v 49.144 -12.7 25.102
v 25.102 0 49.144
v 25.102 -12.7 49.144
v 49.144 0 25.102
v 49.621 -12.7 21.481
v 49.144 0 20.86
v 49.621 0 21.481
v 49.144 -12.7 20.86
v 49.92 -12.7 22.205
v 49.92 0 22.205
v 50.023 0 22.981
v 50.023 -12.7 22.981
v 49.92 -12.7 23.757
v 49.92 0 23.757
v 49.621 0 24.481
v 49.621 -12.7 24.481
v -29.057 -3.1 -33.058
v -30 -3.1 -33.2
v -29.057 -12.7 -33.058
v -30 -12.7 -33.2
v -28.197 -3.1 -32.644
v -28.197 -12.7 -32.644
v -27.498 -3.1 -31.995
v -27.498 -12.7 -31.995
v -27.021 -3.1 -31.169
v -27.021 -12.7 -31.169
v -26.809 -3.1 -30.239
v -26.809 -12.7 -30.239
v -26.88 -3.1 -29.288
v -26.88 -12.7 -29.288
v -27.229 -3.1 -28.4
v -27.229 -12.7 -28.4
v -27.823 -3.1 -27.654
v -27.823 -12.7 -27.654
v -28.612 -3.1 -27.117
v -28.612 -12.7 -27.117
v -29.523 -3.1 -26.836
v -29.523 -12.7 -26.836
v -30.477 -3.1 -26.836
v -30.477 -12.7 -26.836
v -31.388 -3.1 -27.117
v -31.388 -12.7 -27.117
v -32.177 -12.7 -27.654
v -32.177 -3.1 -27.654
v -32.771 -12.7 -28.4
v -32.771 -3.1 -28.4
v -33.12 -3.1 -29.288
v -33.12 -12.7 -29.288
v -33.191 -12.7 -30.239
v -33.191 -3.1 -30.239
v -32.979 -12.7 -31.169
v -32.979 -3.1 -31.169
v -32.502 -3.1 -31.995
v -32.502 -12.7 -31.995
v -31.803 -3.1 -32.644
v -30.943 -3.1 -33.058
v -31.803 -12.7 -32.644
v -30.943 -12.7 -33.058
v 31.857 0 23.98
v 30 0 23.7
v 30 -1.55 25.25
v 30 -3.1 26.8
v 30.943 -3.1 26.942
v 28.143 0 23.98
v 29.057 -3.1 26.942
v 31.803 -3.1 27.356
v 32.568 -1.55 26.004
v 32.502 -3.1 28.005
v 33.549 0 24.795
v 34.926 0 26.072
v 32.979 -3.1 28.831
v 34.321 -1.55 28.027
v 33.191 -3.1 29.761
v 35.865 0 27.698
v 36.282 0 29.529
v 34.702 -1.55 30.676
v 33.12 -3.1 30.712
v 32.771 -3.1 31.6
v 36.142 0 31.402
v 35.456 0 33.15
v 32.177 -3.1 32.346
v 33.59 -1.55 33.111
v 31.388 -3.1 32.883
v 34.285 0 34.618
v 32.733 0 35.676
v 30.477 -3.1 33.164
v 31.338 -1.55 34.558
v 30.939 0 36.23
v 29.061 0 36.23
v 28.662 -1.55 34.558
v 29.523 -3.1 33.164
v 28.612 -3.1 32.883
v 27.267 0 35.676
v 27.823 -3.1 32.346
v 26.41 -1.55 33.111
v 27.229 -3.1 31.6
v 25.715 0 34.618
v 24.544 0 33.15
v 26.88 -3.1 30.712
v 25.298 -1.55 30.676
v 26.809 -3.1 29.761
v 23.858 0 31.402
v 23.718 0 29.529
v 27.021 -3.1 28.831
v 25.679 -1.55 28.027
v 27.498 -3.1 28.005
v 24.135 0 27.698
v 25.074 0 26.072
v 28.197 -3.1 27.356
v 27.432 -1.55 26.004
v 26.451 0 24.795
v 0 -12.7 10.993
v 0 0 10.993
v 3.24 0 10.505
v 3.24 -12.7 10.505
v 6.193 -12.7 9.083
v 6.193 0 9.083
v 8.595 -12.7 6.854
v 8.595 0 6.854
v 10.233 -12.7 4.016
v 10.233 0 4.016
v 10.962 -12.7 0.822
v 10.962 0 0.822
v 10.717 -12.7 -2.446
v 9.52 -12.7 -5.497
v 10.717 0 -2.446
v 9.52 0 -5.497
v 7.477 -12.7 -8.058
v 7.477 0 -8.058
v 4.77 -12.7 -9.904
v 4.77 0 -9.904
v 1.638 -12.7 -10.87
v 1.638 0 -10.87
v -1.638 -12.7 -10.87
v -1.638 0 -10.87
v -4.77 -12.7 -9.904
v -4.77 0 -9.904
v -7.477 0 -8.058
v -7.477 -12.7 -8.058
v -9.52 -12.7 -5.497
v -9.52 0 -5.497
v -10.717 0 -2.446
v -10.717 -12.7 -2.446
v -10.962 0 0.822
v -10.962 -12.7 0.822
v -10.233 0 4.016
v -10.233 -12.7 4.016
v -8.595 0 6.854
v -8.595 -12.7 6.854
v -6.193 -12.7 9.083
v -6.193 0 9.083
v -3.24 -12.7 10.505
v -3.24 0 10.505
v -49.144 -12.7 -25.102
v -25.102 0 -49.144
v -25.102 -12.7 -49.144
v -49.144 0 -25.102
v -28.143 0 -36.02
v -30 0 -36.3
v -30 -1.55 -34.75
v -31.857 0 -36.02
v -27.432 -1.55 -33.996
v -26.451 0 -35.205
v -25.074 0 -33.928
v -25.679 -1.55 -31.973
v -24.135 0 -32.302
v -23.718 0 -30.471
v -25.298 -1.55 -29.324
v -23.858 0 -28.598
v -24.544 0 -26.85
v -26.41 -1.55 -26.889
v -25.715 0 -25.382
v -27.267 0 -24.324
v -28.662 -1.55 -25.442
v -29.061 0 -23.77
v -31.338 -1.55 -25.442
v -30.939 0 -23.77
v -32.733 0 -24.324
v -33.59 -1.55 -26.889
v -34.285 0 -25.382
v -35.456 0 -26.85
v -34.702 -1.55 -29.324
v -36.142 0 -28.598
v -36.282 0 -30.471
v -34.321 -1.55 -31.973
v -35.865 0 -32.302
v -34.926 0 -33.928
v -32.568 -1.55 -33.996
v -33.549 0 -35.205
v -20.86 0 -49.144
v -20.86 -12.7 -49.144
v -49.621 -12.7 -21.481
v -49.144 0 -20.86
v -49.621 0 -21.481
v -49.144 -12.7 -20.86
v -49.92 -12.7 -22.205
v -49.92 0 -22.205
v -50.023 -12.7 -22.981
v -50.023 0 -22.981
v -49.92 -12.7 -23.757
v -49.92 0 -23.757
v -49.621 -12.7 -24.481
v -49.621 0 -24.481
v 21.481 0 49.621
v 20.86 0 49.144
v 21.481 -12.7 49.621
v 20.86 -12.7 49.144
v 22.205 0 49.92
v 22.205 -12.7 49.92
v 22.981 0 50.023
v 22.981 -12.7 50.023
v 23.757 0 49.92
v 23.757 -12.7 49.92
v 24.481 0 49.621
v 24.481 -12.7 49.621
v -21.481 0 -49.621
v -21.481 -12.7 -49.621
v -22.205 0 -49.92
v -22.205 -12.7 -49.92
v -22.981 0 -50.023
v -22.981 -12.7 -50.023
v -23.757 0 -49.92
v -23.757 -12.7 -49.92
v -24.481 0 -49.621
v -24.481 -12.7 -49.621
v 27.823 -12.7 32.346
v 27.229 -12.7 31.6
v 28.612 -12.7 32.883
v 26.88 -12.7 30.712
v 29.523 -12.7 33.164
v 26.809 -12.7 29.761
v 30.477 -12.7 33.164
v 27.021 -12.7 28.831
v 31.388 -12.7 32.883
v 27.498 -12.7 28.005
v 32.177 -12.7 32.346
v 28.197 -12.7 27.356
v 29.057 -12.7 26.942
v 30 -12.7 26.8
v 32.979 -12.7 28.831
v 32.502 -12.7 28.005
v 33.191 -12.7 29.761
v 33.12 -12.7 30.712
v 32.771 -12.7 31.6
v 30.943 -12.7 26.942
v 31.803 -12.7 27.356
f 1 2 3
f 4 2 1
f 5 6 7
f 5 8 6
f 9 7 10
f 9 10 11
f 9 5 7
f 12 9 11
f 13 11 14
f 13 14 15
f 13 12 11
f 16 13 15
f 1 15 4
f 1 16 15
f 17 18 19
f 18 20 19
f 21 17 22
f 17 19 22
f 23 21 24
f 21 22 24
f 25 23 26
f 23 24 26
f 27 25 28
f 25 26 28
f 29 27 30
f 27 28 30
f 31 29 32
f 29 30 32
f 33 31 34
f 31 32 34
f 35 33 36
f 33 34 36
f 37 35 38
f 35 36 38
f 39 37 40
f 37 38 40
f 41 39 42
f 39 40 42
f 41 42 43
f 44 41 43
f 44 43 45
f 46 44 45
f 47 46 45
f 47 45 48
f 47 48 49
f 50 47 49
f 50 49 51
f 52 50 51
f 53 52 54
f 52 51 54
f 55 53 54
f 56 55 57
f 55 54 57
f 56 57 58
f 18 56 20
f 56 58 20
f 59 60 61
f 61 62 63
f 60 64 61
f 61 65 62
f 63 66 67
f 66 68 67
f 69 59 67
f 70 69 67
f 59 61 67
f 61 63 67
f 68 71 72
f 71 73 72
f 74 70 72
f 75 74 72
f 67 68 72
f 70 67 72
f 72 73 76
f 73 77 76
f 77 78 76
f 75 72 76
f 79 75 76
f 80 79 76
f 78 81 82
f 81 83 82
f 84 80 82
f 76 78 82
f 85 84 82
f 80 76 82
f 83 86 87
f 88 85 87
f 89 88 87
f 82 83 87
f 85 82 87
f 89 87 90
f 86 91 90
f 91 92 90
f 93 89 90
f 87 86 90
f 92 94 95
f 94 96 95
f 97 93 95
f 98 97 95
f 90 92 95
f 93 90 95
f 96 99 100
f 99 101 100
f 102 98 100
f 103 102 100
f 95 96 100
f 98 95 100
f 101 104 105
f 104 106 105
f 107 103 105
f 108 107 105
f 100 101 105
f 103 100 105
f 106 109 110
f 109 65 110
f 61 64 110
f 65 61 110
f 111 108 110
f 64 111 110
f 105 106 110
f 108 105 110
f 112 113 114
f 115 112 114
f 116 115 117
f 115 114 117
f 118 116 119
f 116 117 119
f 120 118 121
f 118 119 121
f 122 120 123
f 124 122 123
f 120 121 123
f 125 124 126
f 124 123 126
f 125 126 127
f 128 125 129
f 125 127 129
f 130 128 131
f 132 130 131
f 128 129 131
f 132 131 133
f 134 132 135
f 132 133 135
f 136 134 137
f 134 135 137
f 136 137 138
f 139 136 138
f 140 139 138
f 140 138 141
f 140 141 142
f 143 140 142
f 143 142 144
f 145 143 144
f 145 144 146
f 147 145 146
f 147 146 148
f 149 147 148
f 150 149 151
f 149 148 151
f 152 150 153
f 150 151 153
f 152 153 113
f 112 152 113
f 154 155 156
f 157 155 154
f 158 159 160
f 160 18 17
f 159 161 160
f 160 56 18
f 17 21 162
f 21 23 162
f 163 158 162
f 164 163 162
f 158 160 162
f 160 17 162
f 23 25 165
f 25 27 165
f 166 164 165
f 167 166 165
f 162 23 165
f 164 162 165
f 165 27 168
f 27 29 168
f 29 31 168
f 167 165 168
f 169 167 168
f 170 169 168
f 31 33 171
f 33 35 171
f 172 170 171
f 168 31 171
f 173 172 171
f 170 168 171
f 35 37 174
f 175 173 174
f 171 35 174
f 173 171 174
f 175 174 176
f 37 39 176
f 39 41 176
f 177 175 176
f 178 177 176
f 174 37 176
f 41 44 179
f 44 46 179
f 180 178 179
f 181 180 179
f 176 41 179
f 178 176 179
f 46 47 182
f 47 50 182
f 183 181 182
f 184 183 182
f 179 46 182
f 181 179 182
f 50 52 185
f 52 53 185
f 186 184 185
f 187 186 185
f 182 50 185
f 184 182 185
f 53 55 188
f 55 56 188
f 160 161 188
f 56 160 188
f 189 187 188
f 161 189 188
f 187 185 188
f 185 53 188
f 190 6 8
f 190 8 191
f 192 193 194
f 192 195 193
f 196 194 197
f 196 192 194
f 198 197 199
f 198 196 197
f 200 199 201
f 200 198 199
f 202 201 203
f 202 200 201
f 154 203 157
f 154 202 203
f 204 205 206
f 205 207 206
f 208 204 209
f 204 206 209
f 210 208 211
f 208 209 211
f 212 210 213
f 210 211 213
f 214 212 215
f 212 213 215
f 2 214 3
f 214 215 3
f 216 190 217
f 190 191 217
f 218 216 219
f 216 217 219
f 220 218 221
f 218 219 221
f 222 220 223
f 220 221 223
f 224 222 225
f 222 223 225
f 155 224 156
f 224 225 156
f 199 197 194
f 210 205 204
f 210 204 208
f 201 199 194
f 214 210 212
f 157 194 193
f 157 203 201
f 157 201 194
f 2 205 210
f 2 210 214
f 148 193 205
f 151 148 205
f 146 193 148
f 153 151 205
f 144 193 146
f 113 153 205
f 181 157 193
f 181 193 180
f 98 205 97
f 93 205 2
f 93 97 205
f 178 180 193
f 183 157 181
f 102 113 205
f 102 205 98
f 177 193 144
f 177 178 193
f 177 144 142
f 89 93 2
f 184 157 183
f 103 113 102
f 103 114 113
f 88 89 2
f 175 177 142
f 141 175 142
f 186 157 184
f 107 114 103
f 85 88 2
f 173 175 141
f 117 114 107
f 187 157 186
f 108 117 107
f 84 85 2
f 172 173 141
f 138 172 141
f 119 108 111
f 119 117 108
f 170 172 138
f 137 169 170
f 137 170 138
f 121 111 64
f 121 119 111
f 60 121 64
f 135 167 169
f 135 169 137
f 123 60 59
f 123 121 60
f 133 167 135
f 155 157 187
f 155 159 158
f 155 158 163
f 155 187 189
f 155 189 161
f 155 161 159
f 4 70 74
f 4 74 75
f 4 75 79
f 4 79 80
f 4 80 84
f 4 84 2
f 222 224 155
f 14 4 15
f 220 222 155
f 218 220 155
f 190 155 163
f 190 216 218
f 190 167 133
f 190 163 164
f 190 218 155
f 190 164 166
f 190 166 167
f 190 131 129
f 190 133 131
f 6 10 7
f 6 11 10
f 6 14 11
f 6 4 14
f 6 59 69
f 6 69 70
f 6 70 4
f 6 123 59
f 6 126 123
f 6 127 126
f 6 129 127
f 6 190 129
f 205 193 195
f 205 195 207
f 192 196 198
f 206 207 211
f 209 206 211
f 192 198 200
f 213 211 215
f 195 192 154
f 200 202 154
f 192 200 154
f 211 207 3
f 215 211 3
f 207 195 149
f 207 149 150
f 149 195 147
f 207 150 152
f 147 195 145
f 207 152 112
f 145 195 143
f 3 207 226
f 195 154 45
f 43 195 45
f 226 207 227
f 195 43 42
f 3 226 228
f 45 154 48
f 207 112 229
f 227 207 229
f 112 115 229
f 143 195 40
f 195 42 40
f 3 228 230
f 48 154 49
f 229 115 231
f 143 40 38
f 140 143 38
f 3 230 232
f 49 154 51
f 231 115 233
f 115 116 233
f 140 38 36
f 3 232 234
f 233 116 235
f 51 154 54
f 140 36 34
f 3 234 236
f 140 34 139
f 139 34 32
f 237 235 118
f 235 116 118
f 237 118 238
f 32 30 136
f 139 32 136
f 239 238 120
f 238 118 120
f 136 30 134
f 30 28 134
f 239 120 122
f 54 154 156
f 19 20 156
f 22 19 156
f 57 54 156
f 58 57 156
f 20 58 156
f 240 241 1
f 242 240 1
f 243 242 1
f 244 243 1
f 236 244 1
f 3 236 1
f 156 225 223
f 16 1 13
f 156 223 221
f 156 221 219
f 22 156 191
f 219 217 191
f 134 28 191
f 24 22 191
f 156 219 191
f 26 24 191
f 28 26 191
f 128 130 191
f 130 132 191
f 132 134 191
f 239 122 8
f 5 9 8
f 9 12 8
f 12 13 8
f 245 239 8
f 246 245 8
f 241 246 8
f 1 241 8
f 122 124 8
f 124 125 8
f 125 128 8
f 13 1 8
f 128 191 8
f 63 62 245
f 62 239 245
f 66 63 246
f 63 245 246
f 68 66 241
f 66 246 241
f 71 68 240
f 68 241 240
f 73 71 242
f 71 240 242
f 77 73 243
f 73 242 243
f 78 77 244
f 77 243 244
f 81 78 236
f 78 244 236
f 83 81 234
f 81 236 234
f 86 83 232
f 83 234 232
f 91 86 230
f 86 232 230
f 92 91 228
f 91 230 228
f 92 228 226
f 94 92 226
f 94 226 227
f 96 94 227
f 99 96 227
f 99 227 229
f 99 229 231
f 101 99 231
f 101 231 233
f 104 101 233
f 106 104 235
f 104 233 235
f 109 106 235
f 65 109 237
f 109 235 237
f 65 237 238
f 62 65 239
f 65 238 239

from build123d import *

# Parameters (mm, degrees)
SKETCH2_R                                       = 10.993
BOSS_EXTRUDE1_DEPTH                             = 12.7
CSK_FOR_M6_FLAT_HEAD_MACHINE_SCREW1_D           = 6.4
CSK_FOR_M6_FLAT_HEAD_MACHINE_SCREW1_CSINK_D     = 12.6
CSK_FOR_M6_FLAT_HEAD_MACHINE_SCREW1_CSINK_ANGLE = 90
FILLET1_R                                       = 3


with BuildPart() as part:
    # Sketch2 → Boss-Extrude1 (new body)
    with BuildSketch(Plane(origin=(0, 0, 0), x_dir=(1, 0, 0), z_dir=(0, 1, 0))):
        Polygon((-51.265241636, 22.980970389), (22.980970389, -51.265241636), (51.265241636, -22.980970389), (-22.980970389, 51.265241636), align=None)
        with Locations(Location((0, 0, 0), (0, 0, 270))):
            Circle(SKETCH2_R, mode=Mode.SUBTRACT)
    extrude(amount=-BOSS_EXTRUDE1_DEPTH)

    # CSK for M6 Flat Head Machine Screw1 (through all)
    with Locations(Plane(origin=(-30, 0, -30), x_dir=(0, 0, 1), z_dir=(0, 1, 0))):
        with Locations((0, 0), (60, 60)):
            CounterSinkHole(CSK_FOR_M6_FLAT_HEAD_MACHINE_SCREW1_D / 2, CSK_FOR_M6_FLAT_HEAD_MACHINE_SCREW1_CSINK_D / 2, counter_sink_angle=CSK_FOR_M6_FLAT_HEAD_MACHINE_SCREW1_CSINK_ANGLE)

    # Fillet1
    fillet1_edges = [part.edges().sort_by_distance(p)[0] for p in [
        (-22.980970389, -6.35, -51.265241636),
        (51.265241636, -6.35, 22.980970389),
        (22.980970389, -6.35, 51.265241636),
        (-51.265241636, -6.35, -22.980970389),
    ]]
    fillet(fillet1_edges, radius=FILLET1_R)


solid = part.part
